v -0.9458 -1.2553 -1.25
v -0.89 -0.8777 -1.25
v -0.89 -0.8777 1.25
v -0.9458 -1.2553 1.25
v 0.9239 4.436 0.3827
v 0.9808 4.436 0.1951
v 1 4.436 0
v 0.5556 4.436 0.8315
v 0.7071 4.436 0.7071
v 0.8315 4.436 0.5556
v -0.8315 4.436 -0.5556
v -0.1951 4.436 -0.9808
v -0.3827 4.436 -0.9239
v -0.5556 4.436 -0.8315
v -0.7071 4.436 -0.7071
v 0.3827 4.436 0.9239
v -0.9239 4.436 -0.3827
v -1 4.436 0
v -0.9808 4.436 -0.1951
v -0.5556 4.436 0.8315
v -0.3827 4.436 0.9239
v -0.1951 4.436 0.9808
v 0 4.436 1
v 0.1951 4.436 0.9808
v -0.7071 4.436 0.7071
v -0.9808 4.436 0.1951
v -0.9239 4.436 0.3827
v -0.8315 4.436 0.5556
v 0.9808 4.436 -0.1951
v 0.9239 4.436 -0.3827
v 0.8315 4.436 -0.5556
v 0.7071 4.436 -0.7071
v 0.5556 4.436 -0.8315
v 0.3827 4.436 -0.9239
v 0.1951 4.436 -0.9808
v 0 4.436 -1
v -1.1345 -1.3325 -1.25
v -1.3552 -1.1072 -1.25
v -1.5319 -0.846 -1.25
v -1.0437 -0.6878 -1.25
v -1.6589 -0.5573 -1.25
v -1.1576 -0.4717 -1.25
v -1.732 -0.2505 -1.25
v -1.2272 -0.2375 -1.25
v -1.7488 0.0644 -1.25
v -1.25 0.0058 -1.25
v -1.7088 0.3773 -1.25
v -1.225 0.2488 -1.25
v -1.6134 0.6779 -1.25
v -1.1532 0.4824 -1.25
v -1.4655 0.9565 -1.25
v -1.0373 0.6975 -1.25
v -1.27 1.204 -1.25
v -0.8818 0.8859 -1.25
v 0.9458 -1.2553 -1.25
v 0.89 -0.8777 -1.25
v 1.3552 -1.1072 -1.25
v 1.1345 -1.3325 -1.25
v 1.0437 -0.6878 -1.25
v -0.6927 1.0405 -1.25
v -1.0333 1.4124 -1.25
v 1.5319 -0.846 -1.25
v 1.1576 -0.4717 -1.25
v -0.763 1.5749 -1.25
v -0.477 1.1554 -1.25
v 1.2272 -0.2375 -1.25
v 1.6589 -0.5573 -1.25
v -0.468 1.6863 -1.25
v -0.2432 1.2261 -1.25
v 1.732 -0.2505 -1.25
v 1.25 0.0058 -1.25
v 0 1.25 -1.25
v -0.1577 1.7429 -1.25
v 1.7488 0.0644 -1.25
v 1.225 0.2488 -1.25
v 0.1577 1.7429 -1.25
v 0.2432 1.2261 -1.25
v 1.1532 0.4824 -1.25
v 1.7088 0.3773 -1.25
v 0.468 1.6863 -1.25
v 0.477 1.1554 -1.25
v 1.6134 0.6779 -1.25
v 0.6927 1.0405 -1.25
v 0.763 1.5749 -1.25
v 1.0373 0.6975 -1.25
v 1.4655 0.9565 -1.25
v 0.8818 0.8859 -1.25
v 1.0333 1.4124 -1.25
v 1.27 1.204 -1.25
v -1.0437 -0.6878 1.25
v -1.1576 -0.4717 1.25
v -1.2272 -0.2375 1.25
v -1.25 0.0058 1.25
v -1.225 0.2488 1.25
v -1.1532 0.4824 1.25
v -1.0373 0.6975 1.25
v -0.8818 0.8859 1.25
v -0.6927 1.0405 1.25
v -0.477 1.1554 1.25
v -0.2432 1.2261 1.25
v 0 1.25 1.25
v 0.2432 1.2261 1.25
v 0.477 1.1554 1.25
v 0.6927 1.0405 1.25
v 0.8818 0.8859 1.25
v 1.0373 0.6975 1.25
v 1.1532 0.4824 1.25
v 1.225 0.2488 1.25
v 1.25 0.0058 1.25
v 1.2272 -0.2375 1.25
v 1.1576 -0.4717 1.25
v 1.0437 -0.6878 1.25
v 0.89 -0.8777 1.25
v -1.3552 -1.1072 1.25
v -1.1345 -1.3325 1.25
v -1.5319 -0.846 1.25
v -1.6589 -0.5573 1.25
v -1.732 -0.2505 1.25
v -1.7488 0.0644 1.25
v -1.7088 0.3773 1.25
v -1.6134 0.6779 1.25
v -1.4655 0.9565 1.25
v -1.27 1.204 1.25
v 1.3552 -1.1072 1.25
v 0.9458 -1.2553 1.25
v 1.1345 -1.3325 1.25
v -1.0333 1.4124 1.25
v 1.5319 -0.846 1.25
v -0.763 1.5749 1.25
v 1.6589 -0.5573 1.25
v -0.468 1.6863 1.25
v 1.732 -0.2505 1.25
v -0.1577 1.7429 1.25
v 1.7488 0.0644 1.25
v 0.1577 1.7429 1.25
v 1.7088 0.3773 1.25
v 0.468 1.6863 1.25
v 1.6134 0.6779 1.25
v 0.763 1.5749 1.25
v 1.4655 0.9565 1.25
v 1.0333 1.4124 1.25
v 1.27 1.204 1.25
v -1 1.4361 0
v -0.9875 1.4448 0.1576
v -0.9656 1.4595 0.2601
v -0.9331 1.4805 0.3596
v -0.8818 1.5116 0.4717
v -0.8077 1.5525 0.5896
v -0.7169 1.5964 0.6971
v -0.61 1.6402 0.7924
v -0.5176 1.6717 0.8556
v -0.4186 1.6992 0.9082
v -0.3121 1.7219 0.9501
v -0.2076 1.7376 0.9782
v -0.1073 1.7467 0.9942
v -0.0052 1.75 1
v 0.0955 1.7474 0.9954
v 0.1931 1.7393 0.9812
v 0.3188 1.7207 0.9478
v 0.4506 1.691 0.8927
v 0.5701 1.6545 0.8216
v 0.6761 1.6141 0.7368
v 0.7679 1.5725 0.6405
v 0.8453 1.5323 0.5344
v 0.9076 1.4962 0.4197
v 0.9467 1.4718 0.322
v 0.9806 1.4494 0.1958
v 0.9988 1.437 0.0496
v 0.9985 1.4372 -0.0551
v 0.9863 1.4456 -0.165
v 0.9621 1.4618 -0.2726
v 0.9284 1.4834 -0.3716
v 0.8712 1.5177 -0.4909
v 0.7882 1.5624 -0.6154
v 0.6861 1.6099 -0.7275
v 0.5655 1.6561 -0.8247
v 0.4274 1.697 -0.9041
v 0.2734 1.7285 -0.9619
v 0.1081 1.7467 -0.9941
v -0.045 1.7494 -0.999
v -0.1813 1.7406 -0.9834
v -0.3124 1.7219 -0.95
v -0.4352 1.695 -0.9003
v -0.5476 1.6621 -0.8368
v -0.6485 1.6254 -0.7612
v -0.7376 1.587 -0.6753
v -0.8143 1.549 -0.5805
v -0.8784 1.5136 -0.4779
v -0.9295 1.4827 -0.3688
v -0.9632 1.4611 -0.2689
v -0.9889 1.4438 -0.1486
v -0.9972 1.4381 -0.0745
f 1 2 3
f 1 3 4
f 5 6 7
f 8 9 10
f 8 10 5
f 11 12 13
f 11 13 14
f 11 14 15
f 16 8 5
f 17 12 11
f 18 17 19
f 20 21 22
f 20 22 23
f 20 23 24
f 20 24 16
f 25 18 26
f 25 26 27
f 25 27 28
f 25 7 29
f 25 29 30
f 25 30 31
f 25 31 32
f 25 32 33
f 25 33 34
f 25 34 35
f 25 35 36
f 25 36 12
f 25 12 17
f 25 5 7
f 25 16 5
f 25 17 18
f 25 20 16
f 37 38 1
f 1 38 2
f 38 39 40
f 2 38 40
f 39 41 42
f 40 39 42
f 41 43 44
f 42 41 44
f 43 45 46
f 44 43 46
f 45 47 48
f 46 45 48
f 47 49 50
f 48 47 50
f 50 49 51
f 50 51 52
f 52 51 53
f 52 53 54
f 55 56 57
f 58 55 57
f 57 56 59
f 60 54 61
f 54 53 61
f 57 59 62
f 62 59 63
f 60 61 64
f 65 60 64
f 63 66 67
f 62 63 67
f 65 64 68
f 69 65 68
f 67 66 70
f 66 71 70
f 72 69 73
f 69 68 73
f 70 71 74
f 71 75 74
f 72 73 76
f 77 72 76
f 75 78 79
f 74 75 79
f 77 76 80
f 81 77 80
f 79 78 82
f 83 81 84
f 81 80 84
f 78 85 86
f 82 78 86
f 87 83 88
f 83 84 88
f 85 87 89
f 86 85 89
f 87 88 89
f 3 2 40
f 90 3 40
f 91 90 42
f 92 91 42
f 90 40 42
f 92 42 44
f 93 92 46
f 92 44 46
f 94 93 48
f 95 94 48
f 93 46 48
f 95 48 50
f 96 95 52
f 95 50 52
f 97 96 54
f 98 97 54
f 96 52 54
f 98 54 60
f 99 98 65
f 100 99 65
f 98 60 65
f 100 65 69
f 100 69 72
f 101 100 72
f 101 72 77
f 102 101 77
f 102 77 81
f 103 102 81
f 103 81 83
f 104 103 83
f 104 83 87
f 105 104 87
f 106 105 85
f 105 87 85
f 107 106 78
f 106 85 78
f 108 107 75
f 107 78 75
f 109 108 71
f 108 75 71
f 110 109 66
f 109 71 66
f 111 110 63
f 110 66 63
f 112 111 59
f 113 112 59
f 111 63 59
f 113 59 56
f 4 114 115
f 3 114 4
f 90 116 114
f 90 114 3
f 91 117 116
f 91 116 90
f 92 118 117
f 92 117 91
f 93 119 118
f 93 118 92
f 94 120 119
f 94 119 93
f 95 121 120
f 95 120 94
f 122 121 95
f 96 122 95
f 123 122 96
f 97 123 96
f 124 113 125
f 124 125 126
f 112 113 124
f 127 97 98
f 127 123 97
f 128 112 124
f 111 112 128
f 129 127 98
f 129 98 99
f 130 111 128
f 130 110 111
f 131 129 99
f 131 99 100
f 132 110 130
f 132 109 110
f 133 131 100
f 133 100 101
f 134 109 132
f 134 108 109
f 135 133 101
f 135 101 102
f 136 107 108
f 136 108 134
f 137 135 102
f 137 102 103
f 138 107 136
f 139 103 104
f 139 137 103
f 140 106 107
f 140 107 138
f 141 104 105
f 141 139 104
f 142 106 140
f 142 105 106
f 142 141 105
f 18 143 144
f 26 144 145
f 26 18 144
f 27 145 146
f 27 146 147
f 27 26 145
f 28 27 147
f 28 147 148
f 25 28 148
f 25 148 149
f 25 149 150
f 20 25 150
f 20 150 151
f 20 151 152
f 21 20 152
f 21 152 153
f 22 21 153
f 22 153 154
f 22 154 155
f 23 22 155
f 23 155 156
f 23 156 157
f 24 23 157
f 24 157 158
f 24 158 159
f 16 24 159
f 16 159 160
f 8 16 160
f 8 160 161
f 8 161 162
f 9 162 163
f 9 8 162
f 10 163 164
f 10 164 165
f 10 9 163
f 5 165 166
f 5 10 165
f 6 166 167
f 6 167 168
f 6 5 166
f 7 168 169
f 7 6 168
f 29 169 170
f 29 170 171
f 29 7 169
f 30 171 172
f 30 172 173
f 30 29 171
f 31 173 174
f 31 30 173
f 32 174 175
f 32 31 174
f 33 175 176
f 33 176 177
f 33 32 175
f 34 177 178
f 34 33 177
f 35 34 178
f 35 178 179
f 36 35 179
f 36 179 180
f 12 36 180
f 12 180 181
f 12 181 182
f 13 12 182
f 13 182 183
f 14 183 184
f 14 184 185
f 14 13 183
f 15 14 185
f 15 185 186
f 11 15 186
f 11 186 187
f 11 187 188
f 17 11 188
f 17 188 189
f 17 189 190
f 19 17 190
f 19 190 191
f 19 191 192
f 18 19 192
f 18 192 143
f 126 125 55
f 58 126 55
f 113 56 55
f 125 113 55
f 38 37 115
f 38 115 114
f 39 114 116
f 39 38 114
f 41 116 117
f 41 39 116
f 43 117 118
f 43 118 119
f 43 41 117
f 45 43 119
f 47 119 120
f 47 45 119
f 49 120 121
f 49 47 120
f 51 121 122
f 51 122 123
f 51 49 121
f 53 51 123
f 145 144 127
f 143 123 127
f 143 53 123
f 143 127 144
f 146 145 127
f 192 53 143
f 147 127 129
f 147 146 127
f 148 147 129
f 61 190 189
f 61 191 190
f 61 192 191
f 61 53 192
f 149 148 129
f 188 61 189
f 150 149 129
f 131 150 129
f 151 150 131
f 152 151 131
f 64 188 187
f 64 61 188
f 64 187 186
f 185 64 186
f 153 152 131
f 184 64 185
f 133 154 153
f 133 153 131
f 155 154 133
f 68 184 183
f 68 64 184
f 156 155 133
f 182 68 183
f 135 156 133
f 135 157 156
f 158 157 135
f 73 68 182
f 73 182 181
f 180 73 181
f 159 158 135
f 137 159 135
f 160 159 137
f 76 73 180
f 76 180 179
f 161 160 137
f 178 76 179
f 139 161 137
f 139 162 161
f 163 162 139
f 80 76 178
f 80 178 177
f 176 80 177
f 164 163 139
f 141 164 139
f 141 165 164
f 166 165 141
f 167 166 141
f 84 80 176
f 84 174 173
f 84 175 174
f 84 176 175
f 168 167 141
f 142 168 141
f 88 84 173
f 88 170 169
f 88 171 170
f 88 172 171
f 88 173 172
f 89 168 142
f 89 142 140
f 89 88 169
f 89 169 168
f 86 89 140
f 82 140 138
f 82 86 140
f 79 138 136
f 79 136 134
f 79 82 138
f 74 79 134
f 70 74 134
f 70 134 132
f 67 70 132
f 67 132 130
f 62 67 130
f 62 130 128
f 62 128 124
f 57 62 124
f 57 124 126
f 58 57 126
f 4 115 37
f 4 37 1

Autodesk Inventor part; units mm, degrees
ref_plane "YZ Plane" through (0, 0, 0) normal (1, 0, 0) x (0, 1, 0)
ref_plane "XY Plane" through (0, 0, 0) normal (0, 0, 1) x (1, 0, 0)
sketch "Sketch1" plane through (0, 0, 0) normal (0, 0, 1) x (1, 0, 0)
  circle A0 centre (0, 0) radius 1.75
  circle A1 centre (0, 0) radius 1.25
  line L0 (-0.89, -0.8777) -> (-0.975, -1.4532)
  line L1 (0.89, -0.8777) -> (0.975, -1.4532)
  dimension "d0" = 3.5
  dimension "d1" = 2.5
  dimension "d2" = 1.95
  dimension "d3" = 1.78
extrude "Extrusion1" add sketch "Sketch1" along normal mid plane 2.5 contours A0 L1 A1 L0 picked at (1.5663, 0.14)
chamfer "Chamfer1" distance 0.2 angle 45 2 edges at (-0.975, -1.4532, 0) (0.975, -1.4532, 0)
ref_plane "Work Plane1" through (0, 4.436, 0) normal (0, 1, 0) x (-1, 0, 0)
sketch "Sketch2" plane through (0, 4.436, 0) normal (0, 1, 0) x (-1, 0, 0)
  circle A0 centre (0, 0) radius 1
  dimension "d10" = 2
extrude "Extrusion2" add sketch "Sketch2" against normal up to surface
properties part number "HAND" material "250"
